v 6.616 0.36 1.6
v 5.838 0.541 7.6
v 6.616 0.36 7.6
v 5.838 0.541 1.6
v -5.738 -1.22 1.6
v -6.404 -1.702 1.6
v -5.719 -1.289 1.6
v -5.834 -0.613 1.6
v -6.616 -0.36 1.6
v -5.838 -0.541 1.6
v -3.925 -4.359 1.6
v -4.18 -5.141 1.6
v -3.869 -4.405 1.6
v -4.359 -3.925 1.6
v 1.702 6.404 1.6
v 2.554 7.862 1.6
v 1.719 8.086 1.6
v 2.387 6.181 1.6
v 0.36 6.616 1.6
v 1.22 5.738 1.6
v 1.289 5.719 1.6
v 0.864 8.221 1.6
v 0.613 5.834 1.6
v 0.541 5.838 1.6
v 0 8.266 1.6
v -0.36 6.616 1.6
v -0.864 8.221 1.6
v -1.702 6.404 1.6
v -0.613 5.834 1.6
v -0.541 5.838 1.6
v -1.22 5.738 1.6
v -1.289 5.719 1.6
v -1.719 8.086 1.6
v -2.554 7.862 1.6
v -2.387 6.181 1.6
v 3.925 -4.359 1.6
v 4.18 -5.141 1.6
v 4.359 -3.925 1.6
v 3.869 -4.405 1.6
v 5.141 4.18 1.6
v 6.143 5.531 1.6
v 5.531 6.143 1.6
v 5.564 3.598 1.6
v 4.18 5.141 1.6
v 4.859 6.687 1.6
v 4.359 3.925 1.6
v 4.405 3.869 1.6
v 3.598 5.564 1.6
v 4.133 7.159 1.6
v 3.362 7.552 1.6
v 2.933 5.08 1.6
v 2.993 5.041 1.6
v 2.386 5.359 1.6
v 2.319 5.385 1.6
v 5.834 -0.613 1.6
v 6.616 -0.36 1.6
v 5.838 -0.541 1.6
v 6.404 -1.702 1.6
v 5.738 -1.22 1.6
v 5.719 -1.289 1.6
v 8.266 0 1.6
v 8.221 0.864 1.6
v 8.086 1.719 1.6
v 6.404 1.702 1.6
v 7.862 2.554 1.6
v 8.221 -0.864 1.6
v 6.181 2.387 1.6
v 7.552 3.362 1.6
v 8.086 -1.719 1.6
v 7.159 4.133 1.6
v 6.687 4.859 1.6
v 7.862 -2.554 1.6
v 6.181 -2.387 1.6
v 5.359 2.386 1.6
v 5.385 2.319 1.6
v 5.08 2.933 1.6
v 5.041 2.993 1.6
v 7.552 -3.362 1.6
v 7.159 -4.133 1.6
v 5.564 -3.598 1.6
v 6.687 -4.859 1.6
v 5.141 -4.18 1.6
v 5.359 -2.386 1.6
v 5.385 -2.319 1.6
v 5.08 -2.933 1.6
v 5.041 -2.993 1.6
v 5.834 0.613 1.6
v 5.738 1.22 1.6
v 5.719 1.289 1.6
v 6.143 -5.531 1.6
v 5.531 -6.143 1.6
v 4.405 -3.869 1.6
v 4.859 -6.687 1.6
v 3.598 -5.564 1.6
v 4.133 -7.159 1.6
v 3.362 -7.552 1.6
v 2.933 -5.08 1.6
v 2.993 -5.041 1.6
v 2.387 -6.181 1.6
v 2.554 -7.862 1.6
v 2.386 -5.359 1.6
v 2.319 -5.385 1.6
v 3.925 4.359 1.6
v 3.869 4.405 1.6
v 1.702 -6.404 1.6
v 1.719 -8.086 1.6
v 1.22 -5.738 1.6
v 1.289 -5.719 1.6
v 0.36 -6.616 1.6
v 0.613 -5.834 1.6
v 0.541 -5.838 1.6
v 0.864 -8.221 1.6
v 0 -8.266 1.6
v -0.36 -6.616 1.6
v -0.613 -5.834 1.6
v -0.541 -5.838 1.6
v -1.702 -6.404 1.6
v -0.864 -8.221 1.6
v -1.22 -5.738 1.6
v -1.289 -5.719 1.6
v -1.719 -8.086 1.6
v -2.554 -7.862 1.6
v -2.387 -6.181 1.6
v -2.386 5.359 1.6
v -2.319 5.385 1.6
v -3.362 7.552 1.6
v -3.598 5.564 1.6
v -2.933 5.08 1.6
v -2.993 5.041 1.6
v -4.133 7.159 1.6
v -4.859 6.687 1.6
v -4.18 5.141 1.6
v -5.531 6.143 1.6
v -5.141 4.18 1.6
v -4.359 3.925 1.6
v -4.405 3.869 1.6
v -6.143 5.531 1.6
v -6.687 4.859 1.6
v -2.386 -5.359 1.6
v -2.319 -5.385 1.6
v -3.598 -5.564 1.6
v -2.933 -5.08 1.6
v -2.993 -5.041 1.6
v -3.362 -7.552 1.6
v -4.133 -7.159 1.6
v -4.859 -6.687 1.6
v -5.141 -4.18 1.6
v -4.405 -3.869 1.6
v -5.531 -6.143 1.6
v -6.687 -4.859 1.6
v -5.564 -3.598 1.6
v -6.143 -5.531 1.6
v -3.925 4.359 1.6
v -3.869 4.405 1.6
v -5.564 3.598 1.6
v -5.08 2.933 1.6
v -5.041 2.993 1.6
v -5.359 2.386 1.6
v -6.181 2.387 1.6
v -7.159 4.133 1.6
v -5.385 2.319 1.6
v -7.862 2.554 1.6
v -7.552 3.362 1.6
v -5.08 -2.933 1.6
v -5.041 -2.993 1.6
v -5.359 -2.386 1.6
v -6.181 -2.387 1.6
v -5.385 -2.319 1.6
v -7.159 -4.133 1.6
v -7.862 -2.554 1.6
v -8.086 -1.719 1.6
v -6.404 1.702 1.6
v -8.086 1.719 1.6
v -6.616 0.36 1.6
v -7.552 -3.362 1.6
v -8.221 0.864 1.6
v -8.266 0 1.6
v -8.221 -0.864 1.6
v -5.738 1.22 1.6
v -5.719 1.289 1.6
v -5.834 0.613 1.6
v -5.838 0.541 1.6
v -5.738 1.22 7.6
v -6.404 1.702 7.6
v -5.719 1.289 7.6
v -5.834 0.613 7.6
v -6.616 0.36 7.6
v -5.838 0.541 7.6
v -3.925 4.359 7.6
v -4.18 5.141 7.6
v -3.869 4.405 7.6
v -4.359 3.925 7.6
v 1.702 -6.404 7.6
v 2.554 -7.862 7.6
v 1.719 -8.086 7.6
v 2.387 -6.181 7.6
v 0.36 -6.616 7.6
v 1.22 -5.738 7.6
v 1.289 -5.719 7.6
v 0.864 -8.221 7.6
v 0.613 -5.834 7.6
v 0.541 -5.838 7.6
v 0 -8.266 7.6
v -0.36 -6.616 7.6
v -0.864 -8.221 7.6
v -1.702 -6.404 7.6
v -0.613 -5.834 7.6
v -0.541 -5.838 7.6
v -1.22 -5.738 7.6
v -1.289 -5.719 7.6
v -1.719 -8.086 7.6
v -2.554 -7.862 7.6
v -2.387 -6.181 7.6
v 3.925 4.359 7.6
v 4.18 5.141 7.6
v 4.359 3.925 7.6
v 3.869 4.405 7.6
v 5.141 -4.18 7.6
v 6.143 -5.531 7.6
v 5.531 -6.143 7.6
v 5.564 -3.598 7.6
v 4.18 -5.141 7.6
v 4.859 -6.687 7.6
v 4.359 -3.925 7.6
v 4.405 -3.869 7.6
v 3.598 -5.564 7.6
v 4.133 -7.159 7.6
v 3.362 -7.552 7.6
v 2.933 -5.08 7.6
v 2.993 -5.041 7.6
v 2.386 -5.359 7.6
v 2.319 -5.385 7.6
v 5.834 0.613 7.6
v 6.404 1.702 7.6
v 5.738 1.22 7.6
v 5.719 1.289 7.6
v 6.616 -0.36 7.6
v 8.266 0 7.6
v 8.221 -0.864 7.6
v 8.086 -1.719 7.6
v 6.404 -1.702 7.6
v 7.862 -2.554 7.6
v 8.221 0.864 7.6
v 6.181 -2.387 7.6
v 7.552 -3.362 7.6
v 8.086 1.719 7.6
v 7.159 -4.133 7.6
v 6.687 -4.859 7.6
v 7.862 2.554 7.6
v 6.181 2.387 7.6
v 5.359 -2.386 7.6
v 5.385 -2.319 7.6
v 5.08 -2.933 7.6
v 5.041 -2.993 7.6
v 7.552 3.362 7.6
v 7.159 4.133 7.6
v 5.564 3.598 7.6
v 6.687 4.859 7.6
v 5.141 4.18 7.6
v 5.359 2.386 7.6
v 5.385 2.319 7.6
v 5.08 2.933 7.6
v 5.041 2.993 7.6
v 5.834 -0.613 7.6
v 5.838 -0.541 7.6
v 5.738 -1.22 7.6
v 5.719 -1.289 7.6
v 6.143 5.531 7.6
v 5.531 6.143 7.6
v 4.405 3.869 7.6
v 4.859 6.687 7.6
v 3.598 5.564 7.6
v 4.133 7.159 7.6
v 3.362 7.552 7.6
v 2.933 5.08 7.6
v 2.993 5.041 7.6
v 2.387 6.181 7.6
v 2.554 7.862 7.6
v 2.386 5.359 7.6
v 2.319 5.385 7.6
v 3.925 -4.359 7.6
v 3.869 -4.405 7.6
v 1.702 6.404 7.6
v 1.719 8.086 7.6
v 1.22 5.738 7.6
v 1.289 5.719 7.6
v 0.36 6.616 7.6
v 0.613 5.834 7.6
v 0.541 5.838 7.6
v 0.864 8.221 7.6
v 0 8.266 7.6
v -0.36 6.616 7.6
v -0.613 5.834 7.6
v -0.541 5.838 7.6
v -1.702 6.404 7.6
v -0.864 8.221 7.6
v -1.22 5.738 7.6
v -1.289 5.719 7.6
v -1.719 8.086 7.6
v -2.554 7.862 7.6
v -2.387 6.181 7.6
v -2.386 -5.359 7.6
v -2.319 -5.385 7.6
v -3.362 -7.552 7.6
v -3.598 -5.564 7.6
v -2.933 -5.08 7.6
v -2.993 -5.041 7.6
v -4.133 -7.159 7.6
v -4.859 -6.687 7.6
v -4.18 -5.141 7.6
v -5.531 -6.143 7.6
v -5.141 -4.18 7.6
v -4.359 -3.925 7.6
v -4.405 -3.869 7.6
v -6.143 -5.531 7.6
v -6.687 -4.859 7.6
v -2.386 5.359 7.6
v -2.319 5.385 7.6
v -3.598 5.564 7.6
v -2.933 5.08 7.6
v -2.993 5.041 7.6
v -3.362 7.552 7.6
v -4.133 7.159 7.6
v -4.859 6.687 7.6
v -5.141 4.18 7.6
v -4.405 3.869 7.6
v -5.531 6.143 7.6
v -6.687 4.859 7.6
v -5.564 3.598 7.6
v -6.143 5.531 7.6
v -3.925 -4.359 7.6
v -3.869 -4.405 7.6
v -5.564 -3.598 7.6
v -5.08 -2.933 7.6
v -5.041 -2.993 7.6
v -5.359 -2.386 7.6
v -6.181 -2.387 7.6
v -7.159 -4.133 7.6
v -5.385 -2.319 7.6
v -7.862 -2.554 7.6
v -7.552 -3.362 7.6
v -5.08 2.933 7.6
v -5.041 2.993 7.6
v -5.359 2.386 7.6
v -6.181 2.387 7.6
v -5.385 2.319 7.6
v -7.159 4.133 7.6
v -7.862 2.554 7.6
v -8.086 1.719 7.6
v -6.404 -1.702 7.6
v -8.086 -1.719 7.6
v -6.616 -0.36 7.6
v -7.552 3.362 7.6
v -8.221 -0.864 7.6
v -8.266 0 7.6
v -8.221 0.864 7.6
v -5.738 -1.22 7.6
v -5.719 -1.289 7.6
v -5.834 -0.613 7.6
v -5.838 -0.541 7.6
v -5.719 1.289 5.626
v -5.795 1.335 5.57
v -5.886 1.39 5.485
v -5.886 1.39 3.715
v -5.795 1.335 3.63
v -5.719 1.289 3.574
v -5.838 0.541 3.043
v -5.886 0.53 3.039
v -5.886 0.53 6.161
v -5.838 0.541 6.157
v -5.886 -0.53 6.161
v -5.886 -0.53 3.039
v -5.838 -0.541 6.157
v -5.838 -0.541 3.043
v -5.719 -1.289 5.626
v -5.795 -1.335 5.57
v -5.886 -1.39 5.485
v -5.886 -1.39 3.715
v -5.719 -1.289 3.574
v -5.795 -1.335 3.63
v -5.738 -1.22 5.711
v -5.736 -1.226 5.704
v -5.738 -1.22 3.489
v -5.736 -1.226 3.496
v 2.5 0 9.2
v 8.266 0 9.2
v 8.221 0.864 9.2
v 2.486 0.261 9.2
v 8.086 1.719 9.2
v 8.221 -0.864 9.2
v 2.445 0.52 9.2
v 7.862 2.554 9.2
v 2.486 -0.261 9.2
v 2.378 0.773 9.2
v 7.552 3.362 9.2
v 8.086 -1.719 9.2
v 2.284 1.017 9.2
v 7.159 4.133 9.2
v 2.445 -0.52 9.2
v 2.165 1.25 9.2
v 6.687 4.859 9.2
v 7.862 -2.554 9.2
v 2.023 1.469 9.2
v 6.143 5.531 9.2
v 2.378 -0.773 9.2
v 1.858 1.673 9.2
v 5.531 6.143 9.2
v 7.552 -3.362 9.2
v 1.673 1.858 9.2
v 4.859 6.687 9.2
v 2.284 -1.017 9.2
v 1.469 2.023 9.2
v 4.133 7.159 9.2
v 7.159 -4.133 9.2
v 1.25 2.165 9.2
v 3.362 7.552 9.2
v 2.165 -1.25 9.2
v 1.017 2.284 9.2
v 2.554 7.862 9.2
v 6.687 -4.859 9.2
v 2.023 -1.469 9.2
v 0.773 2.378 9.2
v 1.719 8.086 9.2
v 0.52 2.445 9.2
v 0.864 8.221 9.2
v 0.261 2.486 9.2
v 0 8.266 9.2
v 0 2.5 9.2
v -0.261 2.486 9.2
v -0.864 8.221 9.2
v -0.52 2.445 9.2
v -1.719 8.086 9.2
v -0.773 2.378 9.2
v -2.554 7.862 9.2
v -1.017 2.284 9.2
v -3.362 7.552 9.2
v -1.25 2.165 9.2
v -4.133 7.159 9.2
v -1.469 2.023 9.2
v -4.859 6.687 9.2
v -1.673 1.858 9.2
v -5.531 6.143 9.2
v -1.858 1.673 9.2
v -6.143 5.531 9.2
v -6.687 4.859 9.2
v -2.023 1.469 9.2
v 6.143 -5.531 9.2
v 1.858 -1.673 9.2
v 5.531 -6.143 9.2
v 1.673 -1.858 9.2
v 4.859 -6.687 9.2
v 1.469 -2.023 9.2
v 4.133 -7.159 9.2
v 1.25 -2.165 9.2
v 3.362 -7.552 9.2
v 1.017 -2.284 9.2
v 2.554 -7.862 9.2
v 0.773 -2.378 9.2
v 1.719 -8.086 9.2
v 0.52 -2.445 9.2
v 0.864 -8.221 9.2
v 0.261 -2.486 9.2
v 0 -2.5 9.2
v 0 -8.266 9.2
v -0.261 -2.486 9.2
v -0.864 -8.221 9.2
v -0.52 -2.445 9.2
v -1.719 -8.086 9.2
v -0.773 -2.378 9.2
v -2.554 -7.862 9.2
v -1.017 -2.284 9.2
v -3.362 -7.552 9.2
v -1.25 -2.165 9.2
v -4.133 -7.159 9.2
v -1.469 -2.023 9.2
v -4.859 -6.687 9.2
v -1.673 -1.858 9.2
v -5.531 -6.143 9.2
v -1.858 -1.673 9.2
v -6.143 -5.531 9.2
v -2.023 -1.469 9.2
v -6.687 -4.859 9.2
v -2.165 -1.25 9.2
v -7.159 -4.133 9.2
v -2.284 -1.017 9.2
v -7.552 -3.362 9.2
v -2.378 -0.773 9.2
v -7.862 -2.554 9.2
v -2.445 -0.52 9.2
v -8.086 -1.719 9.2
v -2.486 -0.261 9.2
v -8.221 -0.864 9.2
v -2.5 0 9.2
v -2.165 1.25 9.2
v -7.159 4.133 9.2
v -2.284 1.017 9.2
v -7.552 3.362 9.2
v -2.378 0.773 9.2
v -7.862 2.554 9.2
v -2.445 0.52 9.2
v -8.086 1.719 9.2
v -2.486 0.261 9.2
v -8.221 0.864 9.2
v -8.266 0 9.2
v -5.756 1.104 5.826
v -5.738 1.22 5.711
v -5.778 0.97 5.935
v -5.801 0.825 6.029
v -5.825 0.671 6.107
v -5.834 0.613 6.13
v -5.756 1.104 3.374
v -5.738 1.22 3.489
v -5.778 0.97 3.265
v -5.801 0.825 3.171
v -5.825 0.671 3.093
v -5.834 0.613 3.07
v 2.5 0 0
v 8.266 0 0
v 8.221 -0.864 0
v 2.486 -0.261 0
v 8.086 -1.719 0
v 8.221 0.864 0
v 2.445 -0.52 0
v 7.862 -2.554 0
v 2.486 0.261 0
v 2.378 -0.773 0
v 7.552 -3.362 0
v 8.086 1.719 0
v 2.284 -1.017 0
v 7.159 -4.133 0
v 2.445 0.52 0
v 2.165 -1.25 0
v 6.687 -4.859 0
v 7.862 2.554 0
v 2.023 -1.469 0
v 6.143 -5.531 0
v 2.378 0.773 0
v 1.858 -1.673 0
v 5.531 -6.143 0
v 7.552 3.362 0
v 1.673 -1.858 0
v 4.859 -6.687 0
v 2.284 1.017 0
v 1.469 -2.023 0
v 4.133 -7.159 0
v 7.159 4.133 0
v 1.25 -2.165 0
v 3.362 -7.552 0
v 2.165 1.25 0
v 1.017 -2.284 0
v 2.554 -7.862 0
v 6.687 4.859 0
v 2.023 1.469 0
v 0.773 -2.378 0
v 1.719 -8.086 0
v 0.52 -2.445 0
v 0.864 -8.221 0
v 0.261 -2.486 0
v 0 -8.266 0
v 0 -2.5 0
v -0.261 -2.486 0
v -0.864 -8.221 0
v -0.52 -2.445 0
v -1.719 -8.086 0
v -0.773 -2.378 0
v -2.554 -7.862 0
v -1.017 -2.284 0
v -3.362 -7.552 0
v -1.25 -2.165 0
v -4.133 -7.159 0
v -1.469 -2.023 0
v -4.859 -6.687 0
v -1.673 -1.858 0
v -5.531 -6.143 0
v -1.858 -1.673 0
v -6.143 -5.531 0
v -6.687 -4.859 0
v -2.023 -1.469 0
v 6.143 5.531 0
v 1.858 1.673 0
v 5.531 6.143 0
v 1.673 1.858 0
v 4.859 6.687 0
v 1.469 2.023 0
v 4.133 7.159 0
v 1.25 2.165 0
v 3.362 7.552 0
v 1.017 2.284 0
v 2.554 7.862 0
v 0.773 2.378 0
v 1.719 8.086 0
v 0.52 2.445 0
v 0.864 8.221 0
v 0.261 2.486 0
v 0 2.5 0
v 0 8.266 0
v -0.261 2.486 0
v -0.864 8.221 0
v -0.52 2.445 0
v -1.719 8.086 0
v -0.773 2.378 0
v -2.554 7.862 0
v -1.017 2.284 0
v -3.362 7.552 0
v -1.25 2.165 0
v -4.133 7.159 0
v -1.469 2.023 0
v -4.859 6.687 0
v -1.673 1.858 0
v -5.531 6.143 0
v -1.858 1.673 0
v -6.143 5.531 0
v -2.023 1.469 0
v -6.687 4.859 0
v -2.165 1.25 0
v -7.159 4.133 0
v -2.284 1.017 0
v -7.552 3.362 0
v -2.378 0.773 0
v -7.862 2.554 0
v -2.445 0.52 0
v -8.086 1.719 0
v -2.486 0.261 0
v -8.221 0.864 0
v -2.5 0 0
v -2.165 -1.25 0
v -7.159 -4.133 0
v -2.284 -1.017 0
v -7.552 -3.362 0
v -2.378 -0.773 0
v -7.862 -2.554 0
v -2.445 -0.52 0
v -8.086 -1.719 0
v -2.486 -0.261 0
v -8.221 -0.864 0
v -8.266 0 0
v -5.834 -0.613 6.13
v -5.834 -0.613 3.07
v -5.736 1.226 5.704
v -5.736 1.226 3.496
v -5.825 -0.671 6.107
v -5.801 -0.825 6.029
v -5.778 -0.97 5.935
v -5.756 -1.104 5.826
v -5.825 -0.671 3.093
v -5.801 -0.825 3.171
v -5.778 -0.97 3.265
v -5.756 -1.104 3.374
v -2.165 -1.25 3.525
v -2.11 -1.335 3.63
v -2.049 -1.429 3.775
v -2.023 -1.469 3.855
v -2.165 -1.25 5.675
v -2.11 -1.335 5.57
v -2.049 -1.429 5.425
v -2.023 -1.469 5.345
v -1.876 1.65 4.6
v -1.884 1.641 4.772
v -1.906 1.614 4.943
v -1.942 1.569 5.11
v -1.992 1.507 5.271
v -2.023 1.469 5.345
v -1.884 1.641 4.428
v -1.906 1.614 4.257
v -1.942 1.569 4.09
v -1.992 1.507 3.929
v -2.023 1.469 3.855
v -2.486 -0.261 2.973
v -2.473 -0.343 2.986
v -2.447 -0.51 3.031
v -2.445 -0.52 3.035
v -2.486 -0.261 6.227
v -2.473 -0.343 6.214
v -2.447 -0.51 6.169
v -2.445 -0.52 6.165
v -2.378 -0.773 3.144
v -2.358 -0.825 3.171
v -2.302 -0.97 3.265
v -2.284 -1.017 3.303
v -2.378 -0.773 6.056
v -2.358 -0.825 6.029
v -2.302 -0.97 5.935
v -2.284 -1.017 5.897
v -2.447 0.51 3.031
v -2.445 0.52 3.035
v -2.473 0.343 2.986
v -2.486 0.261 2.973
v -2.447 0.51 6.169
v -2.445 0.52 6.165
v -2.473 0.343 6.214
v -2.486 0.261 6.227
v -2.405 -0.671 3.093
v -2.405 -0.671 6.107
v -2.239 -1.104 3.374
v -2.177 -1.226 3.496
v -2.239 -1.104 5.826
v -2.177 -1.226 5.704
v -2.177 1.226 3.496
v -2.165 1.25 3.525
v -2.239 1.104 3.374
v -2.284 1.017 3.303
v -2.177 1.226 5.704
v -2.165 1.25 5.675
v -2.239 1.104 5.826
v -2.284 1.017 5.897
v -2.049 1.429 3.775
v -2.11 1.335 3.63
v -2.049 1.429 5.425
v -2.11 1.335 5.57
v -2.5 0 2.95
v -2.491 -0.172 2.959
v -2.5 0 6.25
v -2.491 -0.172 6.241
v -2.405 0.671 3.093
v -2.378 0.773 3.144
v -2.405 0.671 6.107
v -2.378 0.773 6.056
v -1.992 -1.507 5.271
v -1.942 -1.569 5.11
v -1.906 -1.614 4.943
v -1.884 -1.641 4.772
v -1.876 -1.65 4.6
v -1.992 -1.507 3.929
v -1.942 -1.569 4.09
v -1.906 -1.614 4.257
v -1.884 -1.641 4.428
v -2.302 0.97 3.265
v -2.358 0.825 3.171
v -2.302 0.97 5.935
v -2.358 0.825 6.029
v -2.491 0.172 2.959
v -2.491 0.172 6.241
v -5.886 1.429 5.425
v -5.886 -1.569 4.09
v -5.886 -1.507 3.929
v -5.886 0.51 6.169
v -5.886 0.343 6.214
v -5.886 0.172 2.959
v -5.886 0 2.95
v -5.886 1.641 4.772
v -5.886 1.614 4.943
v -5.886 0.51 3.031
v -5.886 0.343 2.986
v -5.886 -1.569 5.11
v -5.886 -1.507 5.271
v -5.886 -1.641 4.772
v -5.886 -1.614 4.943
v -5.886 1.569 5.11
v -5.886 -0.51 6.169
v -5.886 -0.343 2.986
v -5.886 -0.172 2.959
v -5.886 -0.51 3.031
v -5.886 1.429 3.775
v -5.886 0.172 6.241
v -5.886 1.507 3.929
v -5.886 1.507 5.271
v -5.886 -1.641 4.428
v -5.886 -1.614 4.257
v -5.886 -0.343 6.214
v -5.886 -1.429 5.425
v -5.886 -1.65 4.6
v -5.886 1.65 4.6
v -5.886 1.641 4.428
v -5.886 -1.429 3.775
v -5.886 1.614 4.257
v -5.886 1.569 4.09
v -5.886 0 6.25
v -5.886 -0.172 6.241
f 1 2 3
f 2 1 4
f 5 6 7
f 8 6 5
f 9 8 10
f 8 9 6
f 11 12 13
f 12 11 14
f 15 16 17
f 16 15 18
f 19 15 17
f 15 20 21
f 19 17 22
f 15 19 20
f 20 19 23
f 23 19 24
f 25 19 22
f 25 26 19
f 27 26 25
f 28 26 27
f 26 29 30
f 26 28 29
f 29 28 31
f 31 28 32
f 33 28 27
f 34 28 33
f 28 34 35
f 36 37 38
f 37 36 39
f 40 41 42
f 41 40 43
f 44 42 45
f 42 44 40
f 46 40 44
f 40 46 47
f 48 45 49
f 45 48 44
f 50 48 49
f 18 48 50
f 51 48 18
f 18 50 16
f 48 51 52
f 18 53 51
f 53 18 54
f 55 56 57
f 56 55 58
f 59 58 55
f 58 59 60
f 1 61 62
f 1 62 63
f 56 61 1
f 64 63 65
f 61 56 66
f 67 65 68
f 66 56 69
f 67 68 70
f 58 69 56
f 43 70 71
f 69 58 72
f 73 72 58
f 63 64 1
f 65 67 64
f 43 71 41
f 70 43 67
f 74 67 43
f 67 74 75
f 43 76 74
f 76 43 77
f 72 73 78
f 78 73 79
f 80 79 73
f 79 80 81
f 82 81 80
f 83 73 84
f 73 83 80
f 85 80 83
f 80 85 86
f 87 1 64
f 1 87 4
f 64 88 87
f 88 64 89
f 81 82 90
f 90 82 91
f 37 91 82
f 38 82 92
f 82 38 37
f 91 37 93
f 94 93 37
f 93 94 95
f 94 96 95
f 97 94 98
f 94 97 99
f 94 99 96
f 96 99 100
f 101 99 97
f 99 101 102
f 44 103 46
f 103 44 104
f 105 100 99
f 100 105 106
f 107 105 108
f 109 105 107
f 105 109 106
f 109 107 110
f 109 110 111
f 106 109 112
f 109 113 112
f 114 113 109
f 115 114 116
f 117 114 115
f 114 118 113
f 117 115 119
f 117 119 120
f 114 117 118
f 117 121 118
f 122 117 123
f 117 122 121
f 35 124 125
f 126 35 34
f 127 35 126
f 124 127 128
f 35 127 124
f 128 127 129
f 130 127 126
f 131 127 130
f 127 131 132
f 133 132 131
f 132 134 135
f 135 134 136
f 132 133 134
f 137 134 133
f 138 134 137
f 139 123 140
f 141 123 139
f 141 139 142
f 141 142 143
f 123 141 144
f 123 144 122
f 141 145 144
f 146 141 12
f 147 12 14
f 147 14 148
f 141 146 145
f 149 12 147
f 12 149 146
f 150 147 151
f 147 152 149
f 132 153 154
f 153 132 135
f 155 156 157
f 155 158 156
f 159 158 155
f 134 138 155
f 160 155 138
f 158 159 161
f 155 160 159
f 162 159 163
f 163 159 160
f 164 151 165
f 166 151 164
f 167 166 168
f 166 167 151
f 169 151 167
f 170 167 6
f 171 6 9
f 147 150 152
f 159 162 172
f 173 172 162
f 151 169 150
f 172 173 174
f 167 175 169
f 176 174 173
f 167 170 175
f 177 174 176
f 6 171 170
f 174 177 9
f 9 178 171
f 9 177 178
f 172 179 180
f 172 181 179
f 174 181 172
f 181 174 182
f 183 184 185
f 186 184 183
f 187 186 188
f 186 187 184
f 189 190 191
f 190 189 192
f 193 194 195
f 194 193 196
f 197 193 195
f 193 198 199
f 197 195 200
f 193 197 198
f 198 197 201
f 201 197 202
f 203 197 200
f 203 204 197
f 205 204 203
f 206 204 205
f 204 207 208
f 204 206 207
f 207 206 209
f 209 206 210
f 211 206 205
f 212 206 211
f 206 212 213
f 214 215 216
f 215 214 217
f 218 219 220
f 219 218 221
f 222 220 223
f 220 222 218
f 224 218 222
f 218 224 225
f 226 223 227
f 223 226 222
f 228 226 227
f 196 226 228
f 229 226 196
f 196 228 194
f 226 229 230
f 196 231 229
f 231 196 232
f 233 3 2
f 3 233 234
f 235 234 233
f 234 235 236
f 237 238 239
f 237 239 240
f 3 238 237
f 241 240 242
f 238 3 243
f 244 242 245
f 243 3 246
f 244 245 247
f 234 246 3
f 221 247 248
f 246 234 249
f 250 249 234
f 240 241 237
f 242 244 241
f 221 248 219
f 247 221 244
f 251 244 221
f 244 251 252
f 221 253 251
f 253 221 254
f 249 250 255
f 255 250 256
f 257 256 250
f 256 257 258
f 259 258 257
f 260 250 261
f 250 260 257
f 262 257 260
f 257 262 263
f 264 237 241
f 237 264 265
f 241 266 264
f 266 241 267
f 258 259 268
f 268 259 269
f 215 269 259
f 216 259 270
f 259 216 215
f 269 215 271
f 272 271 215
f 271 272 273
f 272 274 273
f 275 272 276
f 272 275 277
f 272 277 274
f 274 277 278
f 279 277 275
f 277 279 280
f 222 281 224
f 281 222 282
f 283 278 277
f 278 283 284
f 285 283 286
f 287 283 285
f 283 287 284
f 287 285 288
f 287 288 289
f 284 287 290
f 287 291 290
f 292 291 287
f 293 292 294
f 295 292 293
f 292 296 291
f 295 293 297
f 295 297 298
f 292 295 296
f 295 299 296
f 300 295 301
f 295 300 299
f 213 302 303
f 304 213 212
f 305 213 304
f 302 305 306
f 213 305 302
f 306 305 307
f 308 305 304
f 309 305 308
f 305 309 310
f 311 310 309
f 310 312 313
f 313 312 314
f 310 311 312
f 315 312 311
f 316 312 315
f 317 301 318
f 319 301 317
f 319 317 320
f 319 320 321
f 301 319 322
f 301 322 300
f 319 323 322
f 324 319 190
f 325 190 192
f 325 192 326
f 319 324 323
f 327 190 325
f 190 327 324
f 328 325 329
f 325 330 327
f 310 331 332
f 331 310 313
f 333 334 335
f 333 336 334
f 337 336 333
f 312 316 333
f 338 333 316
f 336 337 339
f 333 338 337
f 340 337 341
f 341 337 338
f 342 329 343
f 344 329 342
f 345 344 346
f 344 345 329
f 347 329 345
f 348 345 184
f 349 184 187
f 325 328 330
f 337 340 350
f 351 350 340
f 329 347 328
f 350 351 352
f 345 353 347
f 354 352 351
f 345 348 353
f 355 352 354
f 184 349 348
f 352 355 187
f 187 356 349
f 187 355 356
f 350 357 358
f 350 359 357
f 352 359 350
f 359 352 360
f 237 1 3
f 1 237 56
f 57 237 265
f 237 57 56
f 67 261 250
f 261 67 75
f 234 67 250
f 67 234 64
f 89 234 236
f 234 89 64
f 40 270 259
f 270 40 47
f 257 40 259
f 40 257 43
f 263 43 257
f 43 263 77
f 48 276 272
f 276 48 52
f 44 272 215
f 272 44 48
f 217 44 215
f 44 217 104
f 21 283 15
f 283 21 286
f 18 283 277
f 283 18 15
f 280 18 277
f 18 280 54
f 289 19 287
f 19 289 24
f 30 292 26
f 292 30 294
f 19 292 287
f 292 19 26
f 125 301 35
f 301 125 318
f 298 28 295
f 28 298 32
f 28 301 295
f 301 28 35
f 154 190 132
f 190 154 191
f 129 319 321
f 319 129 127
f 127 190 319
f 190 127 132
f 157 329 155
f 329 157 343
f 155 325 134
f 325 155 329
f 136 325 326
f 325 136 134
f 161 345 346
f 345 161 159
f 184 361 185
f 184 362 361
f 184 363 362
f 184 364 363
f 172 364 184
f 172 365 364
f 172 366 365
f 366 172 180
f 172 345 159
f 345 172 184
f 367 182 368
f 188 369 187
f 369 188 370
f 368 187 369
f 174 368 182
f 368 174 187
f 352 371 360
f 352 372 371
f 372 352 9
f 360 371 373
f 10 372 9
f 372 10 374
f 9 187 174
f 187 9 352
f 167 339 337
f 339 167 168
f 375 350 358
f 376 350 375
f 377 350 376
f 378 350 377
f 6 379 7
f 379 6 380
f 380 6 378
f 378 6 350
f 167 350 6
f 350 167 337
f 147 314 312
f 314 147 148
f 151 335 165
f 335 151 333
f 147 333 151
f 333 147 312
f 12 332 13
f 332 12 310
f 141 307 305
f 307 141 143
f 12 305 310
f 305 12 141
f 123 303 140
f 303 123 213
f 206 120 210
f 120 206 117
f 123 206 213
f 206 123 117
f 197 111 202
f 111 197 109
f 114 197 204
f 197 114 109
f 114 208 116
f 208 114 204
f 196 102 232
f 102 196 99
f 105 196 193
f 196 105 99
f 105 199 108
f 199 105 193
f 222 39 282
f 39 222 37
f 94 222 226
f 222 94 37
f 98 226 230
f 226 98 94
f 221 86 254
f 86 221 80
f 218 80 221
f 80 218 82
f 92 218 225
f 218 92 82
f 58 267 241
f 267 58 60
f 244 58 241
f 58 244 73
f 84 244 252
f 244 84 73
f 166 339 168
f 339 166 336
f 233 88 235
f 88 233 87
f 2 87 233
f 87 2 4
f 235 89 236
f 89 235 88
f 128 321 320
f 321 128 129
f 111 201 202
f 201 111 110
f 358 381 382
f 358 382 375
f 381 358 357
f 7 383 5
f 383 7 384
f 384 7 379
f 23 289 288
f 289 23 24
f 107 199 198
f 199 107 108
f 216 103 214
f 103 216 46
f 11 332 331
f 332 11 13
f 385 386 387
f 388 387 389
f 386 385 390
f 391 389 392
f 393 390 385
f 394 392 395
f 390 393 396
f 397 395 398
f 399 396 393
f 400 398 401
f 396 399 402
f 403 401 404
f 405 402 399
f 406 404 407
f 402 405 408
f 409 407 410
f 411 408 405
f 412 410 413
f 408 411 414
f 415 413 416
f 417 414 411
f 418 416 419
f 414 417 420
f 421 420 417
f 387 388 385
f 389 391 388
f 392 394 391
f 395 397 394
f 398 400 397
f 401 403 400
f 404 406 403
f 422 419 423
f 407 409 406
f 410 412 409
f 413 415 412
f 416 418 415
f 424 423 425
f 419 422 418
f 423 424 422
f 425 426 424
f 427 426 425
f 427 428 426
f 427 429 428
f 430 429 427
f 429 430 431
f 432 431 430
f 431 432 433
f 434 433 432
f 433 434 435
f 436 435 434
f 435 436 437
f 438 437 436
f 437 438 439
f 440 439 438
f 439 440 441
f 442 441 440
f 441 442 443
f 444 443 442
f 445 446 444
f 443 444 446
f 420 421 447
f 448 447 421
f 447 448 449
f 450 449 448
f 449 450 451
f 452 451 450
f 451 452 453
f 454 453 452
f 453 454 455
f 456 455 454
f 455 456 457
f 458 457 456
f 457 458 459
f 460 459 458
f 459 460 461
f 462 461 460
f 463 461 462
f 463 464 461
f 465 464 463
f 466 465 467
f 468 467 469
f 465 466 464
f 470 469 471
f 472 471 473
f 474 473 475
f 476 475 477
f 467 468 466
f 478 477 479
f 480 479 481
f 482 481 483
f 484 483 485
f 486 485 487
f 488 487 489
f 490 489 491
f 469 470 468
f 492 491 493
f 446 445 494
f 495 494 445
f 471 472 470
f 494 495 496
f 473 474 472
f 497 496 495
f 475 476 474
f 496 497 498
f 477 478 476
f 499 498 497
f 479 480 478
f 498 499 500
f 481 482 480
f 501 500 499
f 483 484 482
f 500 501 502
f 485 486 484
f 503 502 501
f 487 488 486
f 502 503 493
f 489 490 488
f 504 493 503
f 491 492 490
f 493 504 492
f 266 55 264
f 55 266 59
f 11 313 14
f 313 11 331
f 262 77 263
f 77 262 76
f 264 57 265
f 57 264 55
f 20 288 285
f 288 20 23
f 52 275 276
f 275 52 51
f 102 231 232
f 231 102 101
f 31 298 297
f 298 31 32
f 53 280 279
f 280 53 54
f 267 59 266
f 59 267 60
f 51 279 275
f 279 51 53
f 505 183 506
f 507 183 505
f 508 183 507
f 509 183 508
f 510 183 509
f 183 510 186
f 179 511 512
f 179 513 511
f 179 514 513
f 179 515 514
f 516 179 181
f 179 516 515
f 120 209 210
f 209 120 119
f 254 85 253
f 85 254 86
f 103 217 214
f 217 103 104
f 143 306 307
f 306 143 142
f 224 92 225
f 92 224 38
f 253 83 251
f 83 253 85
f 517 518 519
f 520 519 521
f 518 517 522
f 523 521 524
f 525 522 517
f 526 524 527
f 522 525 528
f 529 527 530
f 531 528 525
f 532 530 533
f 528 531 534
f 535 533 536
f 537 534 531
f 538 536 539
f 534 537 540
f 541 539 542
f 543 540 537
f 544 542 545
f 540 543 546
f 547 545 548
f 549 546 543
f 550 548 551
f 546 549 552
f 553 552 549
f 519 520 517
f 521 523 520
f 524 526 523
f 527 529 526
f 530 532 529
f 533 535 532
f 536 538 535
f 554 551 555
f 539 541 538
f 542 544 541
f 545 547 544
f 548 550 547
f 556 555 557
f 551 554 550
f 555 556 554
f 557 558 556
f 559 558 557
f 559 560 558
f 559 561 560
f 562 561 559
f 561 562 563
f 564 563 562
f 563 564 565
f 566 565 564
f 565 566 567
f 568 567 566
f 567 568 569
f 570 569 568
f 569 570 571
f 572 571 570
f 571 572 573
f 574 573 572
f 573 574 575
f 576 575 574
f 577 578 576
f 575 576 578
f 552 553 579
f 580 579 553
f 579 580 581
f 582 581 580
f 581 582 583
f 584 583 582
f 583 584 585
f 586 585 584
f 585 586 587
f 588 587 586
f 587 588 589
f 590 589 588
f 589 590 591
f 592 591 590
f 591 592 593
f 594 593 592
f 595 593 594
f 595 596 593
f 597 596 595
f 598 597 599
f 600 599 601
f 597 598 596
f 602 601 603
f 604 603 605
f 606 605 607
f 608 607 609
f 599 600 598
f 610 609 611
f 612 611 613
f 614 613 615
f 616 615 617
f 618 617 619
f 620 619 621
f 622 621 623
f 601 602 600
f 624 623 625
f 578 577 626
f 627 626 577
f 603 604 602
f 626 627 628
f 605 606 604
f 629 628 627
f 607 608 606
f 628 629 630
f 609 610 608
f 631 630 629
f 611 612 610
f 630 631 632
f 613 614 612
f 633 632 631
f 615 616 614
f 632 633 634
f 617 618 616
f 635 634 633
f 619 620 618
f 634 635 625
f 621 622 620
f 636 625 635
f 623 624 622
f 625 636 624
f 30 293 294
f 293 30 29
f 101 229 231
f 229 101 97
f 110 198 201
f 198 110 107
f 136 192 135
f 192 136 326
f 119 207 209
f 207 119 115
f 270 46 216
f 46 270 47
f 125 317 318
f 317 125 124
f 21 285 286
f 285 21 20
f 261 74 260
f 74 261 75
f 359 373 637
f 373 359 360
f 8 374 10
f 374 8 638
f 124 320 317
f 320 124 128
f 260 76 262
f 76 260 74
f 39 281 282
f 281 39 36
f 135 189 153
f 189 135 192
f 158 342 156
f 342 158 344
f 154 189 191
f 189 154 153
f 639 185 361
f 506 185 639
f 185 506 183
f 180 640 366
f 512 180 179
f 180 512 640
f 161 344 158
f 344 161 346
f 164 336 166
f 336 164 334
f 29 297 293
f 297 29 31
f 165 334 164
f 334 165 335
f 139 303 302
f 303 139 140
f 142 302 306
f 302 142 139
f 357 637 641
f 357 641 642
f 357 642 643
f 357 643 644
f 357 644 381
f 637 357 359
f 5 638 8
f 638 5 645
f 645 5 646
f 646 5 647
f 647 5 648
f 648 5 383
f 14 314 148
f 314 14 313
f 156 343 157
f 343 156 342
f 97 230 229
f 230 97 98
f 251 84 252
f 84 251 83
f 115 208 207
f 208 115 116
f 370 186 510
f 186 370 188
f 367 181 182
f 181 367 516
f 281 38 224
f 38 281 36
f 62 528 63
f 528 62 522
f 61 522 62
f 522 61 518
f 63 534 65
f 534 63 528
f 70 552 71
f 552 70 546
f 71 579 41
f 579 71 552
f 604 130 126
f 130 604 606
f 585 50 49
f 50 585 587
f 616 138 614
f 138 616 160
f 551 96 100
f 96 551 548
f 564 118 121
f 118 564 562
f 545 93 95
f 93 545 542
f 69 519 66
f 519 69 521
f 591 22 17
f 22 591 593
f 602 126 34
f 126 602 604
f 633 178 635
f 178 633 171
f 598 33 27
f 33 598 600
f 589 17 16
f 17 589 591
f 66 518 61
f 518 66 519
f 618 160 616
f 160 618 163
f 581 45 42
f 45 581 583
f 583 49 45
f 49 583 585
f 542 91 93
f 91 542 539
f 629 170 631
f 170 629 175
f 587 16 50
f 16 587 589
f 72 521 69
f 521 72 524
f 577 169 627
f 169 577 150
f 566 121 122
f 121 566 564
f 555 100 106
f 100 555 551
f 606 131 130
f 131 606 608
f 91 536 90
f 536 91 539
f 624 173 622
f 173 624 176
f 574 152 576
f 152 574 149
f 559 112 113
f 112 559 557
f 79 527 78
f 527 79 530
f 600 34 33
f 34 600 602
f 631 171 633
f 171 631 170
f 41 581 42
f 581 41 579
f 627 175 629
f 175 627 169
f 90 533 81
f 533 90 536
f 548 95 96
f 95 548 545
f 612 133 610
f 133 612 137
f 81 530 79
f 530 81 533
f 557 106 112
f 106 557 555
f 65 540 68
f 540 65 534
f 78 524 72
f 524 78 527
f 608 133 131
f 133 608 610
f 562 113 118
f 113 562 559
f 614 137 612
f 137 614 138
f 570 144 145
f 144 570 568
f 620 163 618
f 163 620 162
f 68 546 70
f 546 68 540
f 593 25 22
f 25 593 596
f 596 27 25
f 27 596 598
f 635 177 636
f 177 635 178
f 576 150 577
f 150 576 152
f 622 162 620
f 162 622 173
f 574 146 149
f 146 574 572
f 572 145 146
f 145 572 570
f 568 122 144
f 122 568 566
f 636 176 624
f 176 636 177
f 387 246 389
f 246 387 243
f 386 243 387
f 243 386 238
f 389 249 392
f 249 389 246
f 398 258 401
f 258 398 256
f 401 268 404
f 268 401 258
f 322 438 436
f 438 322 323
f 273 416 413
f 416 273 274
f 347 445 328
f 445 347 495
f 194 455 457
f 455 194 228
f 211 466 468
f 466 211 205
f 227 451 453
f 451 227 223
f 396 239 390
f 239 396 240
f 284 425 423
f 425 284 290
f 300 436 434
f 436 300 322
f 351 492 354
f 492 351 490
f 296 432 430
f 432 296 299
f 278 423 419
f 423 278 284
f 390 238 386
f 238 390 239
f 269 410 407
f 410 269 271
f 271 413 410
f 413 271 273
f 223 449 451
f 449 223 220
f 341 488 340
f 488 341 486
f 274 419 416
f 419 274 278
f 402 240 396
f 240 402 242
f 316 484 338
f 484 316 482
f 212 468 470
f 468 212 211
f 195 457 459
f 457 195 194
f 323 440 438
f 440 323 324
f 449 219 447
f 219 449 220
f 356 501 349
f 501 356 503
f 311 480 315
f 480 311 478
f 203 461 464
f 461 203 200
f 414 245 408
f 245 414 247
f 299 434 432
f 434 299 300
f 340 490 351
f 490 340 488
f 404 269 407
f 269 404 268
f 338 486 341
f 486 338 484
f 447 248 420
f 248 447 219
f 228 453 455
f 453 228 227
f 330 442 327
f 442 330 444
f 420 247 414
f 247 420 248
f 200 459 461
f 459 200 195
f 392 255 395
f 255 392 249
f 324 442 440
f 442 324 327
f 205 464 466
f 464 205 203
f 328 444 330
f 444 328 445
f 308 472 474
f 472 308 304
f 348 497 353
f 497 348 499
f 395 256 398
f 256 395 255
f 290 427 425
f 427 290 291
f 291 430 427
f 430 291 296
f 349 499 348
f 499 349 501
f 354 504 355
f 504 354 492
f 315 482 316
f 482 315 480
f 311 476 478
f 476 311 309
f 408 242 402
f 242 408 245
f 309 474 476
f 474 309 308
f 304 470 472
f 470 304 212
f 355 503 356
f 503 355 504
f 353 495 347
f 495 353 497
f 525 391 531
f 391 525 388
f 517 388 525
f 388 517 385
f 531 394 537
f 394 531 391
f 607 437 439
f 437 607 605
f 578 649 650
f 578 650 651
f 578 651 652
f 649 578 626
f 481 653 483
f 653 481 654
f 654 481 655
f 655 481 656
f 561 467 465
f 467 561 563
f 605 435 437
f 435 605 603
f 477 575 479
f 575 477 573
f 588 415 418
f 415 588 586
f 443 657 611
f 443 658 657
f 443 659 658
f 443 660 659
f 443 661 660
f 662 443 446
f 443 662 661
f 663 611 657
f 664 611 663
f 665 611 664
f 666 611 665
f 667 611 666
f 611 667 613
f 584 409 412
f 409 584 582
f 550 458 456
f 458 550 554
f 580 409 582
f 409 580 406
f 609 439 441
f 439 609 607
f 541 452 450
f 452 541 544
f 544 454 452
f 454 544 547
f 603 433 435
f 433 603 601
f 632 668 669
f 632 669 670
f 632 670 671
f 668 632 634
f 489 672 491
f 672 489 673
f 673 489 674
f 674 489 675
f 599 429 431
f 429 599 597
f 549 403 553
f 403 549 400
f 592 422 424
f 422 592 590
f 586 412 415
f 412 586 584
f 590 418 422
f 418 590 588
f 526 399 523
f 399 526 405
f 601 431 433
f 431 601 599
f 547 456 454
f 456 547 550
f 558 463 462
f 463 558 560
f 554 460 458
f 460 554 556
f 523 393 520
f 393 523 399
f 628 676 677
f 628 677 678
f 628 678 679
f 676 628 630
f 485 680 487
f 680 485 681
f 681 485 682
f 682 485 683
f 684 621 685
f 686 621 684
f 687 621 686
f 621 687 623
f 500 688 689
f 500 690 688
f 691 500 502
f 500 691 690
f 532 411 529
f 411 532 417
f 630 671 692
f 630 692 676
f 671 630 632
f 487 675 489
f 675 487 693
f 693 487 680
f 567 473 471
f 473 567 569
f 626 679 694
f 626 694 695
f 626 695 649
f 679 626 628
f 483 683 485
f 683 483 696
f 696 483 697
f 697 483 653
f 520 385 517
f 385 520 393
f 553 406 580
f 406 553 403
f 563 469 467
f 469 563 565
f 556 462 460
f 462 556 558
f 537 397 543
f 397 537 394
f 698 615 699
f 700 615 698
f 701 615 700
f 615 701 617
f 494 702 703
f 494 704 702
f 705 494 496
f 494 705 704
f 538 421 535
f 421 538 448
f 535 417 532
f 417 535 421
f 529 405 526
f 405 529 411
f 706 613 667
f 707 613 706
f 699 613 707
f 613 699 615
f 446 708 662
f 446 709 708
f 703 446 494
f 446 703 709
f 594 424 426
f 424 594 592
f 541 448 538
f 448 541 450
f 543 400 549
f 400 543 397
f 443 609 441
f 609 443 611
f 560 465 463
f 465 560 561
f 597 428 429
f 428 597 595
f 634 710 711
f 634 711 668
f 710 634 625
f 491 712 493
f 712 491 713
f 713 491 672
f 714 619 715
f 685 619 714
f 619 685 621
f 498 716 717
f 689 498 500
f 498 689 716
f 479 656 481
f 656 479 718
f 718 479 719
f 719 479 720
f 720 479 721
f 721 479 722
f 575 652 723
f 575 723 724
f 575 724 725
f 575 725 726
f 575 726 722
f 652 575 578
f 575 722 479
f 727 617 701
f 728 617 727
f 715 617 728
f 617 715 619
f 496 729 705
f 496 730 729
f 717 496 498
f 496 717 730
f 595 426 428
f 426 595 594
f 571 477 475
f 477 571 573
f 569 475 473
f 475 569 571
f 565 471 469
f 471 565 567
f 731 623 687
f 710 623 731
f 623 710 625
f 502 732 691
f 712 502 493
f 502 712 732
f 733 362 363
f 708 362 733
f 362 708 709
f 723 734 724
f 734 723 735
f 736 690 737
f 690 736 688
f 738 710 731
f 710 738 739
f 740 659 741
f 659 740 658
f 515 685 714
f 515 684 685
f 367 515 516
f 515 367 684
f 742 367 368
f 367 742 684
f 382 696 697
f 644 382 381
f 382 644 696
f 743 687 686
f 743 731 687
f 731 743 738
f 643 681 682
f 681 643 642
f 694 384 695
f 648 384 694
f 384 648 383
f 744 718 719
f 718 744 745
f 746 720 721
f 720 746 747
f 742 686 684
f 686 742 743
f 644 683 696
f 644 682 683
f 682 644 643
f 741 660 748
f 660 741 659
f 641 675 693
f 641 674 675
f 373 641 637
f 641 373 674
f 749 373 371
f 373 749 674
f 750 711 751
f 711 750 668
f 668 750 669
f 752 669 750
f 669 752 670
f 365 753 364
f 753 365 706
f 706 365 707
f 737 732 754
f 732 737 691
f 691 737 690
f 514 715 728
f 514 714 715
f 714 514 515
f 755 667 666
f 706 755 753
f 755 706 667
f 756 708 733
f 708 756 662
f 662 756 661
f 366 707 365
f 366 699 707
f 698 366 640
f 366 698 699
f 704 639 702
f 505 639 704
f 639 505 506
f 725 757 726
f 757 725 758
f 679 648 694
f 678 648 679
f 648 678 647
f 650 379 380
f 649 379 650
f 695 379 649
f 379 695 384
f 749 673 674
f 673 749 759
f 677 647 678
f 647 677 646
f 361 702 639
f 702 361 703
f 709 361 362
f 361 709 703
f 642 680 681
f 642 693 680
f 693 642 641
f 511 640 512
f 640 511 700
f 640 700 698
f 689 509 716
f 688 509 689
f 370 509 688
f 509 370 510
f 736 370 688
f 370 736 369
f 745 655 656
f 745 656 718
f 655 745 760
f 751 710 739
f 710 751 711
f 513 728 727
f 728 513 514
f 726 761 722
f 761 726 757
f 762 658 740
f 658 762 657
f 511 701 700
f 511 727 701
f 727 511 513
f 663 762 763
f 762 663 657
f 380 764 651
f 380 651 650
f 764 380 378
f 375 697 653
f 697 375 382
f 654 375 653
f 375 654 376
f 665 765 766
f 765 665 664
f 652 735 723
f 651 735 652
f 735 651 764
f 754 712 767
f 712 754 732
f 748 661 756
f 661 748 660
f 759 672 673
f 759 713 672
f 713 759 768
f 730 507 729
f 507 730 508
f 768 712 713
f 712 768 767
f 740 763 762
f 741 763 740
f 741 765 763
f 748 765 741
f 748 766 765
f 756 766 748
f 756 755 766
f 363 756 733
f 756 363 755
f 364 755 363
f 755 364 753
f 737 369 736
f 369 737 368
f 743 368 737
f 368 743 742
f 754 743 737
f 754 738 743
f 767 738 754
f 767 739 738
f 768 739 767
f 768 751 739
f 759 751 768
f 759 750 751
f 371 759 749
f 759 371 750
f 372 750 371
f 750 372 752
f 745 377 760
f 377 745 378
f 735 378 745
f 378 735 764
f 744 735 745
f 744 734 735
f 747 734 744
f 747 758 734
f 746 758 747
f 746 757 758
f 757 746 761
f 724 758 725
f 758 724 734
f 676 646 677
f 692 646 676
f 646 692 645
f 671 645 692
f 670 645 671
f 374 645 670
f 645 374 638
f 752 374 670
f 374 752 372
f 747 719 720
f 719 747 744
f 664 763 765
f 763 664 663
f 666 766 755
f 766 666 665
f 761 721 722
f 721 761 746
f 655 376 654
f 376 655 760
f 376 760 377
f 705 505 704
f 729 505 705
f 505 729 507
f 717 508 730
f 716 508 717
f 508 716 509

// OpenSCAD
// GT2 pulley, 20 teeth for 6 mm belt.
$fn = 60;
eps = 0.02;
teeth = 20;
belt_pitch = 2;
belt_w = 6;
shaft_d = 5;
set_screw_d = 3.3;
tooth_depth = 0.75;
tooth_overlap = 0.28;
tooth_base_w = 1.2;
tooth_tip_w = 0.72;
flange_t = 1.6;
core_d = teeth * belt_pitch / PI - 1.0;
body_h = belt_w + 2 * flange_t;
module tooth() {
    linear_extrude(height = belt_w)
        polygon(points = [[-tooth_overlap, -tooth_base_w / 2], [tooth_depth, -tooth_tip_w / 2], [tooth_depth, tooth_tip_w / 2], [-tooth_overlap, tooth_base_w / 2]]);
}
difference() {
    union() {
        cylinder(d = core_d, h = body_h);
        cylinder(d = core_d + 4.8, h = flange_t);
        translate([0, 0, body_h - flange_t]) cylinder(d = core_d + 4.8, h = flange_t);
        for (i = [0 : teeth - 1]) rotate([0, 0, i * 360 / teeth]) translate([core_d / 2, 0, flange_t]) tooth();
    }
    translate([0, 0, -eps]) cylinder(d = shaft_d, h = body_h + 2 * eps);
    translate([-core_d / 2 - eps, 0, body_h / 2]) rotate([0, 90, 0]) cylinder(d = set_screw_d, h = core_d / 2 + 2 * eps);
}
